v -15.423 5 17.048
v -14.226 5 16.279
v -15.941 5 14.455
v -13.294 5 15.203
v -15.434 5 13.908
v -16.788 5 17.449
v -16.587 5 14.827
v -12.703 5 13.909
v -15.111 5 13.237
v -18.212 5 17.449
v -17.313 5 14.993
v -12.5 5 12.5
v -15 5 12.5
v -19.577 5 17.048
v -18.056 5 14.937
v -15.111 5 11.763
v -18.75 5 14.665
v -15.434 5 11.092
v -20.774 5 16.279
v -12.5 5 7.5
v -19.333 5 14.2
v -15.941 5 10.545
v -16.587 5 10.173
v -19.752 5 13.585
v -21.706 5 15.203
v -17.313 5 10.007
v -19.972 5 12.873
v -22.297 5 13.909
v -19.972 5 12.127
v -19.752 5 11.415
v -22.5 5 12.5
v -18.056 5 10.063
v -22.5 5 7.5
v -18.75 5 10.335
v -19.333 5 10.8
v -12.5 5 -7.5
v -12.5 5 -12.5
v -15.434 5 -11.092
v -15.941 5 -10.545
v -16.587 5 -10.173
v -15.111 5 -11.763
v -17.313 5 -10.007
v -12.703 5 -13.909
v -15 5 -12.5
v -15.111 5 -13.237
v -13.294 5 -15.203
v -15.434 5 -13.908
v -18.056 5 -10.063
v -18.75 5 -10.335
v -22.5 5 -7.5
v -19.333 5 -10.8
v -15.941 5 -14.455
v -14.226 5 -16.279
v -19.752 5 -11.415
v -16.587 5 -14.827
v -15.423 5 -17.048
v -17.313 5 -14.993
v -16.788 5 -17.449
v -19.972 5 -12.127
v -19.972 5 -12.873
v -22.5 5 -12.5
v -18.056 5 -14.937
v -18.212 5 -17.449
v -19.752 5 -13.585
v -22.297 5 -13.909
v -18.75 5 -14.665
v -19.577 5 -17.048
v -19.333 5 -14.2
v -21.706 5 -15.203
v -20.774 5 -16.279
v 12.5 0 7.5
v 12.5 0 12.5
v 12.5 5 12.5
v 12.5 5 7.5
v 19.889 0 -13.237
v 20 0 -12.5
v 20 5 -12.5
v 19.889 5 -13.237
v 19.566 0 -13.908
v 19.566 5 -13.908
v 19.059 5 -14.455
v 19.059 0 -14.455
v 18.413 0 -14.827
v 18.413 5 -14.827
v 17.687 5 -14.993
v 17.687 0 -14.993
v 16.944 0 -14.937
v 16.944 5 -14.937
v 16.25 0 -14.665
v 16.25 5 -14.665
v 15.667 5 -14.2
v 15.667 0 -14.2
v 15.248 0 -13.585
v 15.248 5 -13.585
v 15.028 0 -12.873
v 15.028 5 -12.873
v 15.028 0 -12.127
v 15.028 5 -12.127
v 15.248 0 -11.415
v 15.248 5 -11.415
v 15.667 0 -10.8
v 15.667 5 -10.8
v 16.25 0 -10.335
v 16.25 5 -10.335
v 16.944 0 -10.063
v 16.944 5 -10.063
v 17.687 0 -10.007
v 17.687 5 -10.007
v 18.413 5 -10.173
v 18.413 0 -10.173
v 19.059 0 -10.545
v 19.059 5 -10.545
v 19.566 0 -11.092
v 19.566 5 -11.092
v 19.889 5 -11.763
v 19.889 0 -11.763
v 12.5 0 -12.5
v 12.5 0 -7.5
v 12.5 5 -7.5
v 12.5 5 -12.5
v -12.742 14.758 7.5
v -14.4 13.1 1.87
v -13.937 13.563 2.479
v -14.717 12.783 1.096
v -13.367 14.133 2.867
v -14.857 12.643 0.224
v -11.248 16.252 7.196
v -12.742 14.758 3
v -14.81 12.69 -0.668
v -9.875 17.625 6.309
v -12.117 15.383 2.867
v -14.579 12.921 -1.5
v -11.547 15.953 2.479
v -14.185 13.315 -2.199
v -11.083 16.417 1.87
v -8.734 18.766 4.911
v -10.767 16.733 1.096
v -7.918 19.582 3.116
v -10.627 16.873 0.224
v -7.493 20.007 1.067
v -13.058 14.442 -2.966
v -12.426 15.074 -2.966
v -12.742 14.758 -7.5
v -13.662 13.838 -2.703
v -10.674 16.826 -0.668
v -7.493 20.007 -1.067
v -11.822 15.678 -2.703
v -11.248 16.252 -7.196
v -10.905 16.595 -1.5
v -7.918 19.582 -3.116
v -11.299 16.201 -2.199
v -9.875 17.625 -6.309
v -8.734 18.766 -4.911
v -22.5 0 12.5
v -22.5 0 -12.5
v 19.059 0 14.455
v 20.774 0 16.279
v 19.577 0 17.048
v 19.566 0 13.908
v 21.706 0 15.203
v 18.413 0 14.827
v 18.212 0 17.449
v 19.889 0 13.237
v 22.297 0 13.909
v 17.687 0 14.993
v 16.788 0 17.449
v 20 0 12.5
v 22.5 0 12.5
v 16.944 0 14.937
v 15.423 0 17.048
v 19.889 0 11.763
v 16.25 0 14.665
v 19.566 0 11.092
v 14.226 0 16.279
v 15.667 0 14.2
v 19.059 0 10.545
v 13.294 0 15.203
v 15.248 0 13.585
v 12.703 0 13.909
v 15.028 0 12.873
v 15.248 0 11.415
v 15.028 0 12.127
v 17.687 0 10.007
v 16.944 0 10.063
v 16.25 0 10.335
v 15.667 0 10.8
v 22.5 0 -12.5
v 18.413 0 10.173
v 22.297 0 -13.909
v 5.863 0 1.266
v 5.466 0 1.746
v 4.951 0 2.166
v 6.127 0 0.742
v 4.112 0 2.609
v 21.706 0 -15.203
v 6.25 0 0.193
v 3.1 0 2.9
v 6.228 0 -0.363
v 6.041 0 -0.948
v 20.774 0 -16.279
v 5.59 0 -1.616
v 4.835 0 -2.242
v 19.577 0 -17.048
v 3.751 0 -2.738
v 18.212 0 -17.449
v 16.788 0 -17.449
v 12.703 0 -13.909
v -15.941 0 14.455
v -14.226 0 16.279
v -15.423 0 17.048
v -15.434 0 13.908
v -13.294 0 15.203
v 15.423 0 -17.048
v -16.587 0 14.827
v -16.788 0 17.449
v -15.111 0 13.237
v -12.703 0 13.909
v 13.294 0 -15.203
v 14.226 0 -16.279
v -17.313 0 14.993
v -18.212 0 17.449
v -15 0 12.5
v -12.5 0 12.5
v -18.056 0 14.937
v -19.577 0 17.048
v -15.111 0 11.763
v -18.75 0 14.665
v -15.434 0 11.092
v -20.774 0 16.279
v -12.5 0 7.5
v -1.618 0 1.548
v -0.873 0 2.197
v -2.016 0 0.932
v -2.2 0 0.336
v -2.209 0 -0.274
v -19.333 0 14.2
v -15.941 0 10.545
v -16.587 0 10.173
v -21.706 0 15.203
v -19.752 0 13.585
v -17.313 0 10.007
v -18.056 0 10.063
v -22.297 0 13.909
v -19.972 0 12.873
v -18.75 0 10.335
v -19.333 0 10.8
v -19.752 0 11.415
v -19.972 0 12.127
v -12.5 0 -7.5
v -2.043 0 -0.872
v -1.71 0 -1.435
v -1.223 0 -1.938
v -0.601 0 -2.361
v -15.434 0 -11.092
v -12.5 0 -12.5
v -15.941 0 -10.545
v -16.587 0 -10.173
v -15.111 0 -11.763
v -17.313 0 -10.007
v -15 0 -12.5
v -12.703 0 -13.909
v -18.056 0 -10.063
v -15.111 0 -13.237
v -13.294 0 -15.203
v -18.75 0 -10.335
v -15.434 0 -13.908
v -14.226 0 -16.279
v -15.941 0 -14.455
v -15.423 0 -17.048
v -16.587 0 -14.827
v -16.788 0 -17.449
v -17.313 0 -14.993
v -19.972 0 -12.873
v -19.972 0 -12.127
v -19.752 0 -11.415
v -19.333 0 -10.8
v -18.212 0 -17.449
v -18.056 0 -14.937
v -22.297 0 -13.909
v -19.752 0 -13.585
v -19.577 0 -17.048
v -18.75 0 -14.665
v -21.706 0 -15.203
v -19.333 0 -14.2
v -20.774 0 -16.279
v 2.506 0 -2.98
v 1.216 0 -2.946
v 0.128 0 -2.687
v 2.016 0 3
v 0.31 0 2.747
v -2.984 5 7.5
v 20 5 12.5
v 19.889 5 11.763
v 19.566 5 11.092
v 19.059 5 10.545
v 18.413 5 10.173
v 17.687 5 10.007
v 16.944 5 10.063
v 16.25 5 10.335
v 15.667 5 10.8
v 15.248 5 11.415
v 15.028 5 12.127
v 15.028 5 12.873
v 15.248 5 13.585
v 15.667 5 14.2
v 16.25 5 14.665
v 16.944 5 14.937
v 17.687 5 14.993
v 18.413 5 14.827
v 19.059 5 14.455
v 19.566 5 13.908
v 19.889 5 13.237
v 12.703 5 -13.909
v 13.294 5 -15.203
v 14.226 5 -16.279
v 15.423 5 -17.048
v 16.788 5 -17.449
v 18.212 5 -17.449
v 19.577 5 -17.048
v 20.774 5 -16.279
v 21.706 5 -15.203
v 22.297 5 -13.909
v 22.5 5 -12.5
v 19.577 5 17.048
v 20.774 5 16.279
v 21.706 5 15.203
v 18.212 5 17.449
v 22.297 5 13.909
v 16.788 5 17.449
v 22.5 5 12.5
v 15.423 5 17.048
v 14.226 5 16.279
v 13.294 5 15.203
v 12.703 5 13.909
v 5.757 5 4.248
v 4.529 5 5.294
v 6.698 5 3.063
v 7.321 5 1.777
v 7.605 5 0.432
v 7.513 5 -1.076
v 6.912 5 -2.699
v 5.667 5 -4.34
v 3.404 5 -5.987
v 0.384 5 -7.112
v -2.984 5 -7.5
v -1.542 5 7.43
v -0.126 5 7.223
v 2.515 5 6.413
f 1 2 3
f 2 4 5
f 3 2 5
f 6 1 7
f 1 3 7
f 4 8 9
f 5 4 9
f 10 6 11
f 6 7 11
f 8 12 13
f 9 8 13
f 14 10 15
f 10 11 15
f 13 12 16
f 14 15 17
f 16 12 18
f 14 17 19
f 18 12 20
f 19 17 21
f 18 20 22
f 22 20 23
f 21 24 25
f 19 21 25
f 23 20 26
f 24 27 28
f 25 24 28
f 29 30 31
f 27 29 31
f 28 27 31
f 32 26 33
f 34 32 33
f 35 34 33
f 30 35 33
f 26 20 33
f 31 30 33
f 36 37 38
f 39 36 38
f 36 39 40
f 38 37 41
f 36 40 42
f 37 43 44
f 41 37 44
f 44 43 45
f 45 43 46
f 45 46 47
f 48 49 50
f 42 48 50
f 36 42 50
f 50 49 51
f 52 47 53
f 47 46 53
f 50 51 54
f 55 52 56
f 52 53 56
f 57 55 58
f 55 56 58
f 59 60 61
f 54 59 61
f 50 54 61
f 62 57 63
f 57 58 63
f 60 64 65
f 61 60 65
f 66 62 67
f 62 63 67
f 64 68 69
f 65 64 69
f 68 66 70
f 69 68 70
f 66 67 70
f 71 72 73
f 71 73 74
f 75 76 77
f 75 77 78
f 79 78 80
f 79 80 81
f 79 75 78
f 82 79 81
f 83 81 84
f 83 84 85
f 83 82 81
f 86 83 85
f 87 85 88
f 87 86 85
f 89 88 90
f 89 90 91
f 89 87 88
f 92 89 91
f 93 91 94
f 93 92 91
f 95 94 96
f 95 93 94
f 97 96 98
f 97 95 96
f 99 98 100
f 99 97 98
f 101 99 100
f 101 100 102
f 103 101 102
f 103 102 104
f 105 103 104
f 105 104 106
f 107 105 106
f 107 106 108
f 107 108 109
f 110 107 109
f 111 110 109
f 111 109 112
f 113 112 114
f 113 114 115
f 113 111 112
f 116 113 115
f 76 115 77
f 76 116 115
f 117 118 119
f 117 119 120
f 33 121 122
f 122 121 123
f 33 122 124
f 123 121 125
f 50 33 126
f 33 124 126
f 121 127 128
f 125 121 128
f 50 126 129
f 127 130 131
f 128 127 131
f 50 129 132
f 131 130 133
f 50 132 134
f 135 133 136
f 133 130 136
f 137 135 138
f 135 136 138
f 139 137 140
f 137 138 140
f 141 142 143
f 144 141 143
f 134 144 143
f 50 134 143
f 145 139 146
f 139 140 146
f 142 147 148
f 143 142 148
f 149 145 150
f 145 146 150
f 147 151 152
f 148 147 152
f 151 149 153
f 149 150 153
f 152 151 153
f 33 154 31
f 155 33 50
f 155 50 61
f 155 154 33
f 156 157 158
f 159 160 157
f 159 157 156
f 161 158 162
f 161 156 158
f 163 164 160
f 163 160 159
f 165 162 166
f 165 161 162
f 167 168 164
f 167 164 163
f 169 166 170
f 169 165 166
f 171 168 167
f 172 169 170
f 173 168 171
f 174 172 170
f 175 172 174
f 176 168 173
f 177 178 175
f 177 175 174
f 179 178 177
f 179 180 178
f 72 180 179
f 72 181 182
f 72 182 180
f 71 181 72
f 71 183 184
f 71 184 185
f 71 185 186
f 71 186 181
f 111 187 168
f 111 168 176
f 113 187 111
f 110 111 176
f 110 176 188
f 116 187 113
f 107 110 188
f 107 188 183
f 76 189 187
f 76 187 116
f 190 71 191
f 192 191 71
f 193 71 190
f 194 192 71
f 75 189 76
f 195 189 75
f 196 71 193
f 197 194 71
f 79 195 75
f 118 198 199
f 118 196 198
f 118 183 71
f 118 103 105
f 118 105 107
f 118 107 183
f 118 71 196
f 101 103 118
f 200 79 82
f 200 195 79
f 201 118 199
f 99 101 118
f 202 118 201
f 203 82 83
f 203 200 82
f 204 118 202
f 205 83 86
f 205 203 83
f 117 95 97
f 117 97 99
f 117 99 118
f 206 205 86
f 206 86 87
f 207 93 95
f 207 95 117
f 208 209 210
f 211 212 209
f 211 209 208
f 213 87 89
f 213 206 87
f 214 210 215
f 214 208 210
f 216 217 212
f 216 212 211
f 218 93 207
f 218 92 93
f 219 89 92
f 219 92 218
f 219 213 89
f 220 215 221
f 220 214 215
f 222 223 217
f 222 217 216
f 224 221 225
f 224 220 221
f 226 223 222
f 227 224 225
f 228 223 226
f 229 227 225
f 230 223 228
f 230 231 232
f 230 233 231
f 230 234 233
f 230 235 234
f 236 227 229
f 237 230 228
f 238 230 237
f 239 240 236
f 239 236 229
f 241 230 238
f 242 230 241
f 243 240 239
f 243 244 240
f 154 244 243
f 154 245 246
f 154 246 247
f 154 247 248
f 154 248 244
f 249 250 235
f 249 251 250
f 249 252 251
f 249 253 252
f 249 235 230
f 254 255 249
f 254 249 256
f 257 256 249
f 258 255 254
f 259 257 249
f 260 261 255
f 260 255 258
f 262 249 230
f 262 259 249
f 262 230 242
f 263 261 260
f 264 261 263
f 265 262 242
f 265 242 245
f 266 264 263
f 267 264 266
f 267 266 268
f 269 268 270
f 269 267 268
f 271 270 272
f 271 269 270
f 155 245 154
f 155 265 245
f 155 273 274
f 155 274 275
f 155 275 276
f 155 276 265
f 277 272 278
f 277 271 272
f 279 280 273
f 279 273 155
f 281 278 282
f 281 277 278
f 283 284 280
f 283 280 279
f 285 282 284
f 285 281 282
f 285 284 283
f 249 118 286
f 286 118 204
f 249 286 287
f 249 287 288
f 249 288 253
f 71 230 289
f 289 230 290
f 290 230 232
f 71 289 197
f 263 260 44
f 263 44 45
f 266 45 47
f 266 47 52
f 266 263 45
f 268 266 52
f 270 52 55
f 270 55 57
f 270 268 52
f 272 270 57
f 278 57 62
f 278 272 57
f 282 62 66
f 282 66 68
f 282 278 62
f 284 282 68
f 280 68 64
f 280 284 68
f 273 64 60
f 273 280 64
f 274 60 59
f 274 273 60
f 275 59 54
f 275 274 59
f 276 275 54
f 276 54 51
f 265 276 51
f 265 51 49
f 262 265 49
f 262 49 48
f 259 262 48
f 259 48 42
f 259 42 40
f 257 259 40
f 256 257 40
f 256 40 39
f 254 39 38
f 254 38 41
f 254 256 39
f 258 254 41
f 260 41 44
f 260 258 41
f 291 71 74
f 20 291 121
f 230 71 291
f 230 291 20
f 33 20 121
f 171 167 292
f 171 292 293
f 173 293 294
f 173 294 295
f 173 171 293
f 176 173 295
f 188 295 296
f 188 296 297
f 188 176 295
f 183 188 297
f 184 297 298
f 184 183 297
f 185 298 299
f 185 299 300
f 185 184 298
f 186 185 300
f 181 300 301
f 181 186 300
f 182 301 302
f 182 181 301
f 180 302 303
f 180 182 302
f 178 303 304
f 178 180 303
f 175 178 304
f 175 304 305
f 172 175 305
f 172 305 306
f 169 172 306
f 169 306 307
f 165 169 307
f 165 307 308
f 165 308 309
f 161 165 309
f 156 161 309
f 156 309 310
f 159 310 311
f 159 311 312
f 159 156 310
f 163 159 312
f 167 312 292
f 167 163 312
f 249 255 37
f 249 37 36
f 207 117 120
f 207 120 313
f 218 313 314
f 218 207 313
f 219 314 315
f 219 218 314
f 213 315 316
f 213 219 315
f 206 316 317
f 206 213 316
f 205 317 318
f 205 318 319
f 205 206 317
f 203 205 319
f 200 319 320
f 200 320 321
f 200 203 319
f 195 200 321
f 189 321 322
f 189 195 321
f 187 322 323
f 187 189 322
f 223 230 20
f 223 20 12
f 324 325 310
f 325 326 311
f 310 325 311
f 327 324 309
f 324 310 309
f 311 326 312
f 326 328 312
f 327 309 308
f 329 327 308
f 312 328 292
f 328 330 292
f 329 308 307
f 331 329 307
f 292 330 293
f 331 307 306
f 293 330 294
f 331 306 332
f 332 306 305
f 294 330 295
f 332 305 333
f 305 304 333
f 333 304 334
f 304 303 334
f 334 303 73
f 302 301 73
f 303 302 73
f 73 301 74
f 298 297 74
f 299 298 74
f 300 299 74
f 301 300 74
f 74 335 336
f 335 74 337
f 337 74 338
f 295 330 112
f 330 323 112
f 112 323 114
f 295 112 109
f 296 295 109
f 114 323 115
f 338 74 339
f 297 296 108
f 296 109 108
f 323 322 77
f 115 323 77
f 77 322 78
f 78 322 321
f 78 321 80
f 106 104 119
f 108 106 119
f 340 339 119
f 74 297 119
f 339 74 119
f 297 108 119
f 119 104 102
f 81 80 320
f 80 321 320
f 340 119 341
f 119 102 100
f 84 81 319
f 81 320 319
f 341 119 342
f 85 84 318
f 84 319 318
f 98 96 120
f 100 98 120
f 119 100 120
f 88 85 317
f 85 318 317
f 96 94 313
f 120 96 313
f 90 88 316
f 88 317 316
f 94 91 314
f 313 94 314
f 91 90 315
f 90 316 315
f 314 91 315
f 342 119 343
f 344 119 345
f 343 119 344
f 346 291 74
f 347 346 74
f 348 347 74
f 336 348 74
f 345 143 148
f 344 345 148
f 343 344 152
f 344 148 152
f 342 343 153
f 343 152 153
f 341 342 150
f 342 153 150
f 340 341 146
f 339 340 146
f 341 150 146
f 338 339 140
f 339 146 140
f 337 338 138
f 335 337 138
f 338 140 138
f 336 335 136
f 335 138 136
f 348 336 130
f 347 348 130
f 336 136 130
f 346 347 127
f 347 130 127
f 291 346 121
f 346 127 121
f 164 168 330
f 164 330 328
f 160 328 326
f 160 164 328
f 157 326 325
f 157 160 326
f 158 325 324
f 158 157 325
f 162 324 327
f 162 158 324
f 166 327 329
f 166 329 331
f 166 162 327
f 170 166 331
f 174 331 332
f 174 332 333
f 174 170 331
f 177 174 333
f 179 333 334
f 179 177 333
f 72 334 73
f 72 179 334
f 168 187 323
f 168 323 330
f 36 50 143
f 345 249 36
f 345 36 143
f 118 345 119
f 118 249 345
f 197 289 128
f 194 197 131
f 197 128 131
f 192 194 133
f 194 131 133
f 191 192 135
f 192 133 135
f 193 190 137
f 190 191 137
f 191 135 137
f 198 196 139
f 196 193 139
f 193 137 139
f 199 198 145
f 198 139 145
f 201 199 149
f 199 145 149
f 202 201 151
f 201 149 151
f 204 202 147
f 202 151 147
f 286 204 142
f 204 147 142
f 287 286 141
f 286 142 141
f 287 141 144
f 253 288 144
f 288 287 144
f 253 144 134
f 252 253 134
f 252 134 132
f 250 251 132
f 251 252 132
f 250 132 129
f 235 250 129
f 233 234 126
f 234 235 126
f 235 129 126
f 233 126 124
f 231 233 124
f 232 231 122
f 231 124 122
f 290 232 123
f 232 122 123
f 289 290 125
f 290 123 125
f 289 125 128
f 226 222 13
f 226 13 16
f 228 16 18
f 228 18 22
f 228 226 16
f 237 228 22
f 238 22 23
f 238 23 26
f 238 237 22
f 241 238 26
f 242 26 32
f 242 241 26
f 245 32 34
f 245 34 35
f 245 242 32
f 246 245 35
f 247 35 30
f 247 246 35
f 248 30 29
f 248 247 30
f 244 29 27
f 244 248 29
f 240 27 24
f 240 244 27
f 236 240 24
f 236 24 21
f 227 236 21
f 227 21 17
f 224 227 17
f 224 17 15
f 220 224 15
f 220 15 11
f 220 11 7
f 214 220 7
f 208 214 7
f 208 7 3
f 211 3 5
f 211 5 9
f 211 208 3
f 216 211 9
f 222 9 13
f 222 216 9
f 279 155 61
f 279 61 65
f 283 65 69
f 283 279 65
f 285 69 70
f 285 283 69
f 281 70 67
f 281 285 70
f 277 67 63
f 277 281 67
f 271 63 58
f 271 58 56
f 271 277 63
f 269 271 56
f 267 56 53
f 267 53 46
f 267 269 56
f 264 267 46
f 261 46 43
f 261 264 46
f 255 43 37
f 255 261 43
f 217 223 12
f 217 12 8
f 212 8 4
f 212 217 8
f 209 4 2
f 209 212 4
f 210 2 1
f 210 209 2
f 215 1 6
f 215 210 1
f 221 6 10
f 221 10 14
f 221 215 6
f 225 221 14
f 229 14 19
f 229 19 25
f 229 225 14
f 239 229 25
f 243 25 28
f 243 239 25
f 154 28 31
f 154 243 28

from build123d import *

# Parameters (mm, degrees)
SKETCH_1_R          = 2.5
EXTRUDE_1_DEPTH     = 5
EXTRUDE_3_REACH     = 37.355
SKETCH_6_R          = 3
SKETCH_9_R          = 3
CUT_EXTRUDE_2_DEPTH = 36.355339059


with BuildPart() as part:
    # 草圖1 → 填料-伸長1 (new body)
    with BuildSketch(Plane(origin=(0, 0, 0), x_dir=(1, 0, 0), z_dir=(0, 1, 0))):
        with BuildLine():
            Line((-12.5, 7.5), (12.5, 7.5))
            Line((12.5, 7.5), (12.5, 12.5))
            ThreePointArc((12.5, 12.5), (17.5, 17.5), (22.5, 12.5))
            Line((22.5, 12.5), (22.5, -12.5))
            ThreePointArc((22.5, -12.5), (17.5, -17.5), (12.5, -12.5))
            Line((12.5, -12.5), (12.5, -7.5))
            Line((12.5, -7.5), (-12.5, -7.5))
            Line((-12.5, -7.5), (-12.5, -12.5))
            ThreePointArc((-12.5, -12.5), (-17.5, -17.5), (-22.5, -12.5))
            Line((-22.5, -12.5), (-22.5, 12.5))
            ThreePointArc((-22.5, 12.5), (-17.5, 17.5), (-12.5, 12.5))
            Line((-12.5, 12.5), (-12.5, 7.5))
        make_face()
        with Locations((-17.5, -12.5)):
            Circle(SKETCH_1_R, mode=Mode.SUBTRACT)
        with Locations((-17.5, 12.5)):
            Circle(SKETCH_1_R, mode=Mode.SUBTRACT)
        with Locations((17.5, -12.5)):
            Circle(SKETCH_1_R, mode=Mode.SUBTRACT)
        with Locations((17.5, 12.5)):
            Circle(SKETCH_1_R, mode=Mode.SUBTRACT)
    extrude(amount=EXTRUDE_1_DEPTH)

    # 填料-伸長3: up to this face of the body (flat: up to its plane)
    extrude_3_end = Plane(part.part.faces().sort_by_distance((0, 0, 0))[0])
    # 草圖6 → 填料-伸長3 (add, up to the picked face)
    with BuildSketch(Plane(origin=(-13.75, 13.75, 0), x_dir=(0, 0, 1), z_dir=(-0.707106781, 0.707106781, 0)), mode=Mode.PRIVATE) as extrude_3_sk1:
        with BuildLine():
            Line((-7.5, -12.374368671), (-7.5, 1.425631329))
            ThreePointArc((-7.5, 1.425631329), (0, 8.925631329), (7.5, 1.425631329))
            Line((7.5, 1.425631329), (7.5, -12.374368671))
            Line((7.5, -12.374368671), (-7.5, -12.374368671))
        make_face()
        with Locations((0, 1.425631329)):
            Circle(SKETCH_6_R, mode=Mode.SUBTRACT)
    extrude_3_tool1 = split(extrude(extrude_3_sk1.sketch, amount=-EXTRUDE_3_REACH, mode=Mode.PRIVATE), bisect_by=extrude_3_end, keep=Keep.BOTH, mode=Mode.PRIVATE)
    add(extrude_3_tool1.solids().sort_by_distance((-15.778761, 11.721239, 0))[0])

    # 草圖9 → 除料-伸長2 (cut, through all)
    with BuildSketch(Plane(origin=(-13.75, 13.75, 0), x_dir=(0, 0, 1), z_dir=(-0.707106781, 0.707106781, 0))):
        with Locations((0, 1.425631329)):
            Circle(SKETCH_9_R)
    extrude(amount=-CUT_EXTRUDE_2_DEPTH, mode=Mode.SUBTRACT)


solid = part.part
